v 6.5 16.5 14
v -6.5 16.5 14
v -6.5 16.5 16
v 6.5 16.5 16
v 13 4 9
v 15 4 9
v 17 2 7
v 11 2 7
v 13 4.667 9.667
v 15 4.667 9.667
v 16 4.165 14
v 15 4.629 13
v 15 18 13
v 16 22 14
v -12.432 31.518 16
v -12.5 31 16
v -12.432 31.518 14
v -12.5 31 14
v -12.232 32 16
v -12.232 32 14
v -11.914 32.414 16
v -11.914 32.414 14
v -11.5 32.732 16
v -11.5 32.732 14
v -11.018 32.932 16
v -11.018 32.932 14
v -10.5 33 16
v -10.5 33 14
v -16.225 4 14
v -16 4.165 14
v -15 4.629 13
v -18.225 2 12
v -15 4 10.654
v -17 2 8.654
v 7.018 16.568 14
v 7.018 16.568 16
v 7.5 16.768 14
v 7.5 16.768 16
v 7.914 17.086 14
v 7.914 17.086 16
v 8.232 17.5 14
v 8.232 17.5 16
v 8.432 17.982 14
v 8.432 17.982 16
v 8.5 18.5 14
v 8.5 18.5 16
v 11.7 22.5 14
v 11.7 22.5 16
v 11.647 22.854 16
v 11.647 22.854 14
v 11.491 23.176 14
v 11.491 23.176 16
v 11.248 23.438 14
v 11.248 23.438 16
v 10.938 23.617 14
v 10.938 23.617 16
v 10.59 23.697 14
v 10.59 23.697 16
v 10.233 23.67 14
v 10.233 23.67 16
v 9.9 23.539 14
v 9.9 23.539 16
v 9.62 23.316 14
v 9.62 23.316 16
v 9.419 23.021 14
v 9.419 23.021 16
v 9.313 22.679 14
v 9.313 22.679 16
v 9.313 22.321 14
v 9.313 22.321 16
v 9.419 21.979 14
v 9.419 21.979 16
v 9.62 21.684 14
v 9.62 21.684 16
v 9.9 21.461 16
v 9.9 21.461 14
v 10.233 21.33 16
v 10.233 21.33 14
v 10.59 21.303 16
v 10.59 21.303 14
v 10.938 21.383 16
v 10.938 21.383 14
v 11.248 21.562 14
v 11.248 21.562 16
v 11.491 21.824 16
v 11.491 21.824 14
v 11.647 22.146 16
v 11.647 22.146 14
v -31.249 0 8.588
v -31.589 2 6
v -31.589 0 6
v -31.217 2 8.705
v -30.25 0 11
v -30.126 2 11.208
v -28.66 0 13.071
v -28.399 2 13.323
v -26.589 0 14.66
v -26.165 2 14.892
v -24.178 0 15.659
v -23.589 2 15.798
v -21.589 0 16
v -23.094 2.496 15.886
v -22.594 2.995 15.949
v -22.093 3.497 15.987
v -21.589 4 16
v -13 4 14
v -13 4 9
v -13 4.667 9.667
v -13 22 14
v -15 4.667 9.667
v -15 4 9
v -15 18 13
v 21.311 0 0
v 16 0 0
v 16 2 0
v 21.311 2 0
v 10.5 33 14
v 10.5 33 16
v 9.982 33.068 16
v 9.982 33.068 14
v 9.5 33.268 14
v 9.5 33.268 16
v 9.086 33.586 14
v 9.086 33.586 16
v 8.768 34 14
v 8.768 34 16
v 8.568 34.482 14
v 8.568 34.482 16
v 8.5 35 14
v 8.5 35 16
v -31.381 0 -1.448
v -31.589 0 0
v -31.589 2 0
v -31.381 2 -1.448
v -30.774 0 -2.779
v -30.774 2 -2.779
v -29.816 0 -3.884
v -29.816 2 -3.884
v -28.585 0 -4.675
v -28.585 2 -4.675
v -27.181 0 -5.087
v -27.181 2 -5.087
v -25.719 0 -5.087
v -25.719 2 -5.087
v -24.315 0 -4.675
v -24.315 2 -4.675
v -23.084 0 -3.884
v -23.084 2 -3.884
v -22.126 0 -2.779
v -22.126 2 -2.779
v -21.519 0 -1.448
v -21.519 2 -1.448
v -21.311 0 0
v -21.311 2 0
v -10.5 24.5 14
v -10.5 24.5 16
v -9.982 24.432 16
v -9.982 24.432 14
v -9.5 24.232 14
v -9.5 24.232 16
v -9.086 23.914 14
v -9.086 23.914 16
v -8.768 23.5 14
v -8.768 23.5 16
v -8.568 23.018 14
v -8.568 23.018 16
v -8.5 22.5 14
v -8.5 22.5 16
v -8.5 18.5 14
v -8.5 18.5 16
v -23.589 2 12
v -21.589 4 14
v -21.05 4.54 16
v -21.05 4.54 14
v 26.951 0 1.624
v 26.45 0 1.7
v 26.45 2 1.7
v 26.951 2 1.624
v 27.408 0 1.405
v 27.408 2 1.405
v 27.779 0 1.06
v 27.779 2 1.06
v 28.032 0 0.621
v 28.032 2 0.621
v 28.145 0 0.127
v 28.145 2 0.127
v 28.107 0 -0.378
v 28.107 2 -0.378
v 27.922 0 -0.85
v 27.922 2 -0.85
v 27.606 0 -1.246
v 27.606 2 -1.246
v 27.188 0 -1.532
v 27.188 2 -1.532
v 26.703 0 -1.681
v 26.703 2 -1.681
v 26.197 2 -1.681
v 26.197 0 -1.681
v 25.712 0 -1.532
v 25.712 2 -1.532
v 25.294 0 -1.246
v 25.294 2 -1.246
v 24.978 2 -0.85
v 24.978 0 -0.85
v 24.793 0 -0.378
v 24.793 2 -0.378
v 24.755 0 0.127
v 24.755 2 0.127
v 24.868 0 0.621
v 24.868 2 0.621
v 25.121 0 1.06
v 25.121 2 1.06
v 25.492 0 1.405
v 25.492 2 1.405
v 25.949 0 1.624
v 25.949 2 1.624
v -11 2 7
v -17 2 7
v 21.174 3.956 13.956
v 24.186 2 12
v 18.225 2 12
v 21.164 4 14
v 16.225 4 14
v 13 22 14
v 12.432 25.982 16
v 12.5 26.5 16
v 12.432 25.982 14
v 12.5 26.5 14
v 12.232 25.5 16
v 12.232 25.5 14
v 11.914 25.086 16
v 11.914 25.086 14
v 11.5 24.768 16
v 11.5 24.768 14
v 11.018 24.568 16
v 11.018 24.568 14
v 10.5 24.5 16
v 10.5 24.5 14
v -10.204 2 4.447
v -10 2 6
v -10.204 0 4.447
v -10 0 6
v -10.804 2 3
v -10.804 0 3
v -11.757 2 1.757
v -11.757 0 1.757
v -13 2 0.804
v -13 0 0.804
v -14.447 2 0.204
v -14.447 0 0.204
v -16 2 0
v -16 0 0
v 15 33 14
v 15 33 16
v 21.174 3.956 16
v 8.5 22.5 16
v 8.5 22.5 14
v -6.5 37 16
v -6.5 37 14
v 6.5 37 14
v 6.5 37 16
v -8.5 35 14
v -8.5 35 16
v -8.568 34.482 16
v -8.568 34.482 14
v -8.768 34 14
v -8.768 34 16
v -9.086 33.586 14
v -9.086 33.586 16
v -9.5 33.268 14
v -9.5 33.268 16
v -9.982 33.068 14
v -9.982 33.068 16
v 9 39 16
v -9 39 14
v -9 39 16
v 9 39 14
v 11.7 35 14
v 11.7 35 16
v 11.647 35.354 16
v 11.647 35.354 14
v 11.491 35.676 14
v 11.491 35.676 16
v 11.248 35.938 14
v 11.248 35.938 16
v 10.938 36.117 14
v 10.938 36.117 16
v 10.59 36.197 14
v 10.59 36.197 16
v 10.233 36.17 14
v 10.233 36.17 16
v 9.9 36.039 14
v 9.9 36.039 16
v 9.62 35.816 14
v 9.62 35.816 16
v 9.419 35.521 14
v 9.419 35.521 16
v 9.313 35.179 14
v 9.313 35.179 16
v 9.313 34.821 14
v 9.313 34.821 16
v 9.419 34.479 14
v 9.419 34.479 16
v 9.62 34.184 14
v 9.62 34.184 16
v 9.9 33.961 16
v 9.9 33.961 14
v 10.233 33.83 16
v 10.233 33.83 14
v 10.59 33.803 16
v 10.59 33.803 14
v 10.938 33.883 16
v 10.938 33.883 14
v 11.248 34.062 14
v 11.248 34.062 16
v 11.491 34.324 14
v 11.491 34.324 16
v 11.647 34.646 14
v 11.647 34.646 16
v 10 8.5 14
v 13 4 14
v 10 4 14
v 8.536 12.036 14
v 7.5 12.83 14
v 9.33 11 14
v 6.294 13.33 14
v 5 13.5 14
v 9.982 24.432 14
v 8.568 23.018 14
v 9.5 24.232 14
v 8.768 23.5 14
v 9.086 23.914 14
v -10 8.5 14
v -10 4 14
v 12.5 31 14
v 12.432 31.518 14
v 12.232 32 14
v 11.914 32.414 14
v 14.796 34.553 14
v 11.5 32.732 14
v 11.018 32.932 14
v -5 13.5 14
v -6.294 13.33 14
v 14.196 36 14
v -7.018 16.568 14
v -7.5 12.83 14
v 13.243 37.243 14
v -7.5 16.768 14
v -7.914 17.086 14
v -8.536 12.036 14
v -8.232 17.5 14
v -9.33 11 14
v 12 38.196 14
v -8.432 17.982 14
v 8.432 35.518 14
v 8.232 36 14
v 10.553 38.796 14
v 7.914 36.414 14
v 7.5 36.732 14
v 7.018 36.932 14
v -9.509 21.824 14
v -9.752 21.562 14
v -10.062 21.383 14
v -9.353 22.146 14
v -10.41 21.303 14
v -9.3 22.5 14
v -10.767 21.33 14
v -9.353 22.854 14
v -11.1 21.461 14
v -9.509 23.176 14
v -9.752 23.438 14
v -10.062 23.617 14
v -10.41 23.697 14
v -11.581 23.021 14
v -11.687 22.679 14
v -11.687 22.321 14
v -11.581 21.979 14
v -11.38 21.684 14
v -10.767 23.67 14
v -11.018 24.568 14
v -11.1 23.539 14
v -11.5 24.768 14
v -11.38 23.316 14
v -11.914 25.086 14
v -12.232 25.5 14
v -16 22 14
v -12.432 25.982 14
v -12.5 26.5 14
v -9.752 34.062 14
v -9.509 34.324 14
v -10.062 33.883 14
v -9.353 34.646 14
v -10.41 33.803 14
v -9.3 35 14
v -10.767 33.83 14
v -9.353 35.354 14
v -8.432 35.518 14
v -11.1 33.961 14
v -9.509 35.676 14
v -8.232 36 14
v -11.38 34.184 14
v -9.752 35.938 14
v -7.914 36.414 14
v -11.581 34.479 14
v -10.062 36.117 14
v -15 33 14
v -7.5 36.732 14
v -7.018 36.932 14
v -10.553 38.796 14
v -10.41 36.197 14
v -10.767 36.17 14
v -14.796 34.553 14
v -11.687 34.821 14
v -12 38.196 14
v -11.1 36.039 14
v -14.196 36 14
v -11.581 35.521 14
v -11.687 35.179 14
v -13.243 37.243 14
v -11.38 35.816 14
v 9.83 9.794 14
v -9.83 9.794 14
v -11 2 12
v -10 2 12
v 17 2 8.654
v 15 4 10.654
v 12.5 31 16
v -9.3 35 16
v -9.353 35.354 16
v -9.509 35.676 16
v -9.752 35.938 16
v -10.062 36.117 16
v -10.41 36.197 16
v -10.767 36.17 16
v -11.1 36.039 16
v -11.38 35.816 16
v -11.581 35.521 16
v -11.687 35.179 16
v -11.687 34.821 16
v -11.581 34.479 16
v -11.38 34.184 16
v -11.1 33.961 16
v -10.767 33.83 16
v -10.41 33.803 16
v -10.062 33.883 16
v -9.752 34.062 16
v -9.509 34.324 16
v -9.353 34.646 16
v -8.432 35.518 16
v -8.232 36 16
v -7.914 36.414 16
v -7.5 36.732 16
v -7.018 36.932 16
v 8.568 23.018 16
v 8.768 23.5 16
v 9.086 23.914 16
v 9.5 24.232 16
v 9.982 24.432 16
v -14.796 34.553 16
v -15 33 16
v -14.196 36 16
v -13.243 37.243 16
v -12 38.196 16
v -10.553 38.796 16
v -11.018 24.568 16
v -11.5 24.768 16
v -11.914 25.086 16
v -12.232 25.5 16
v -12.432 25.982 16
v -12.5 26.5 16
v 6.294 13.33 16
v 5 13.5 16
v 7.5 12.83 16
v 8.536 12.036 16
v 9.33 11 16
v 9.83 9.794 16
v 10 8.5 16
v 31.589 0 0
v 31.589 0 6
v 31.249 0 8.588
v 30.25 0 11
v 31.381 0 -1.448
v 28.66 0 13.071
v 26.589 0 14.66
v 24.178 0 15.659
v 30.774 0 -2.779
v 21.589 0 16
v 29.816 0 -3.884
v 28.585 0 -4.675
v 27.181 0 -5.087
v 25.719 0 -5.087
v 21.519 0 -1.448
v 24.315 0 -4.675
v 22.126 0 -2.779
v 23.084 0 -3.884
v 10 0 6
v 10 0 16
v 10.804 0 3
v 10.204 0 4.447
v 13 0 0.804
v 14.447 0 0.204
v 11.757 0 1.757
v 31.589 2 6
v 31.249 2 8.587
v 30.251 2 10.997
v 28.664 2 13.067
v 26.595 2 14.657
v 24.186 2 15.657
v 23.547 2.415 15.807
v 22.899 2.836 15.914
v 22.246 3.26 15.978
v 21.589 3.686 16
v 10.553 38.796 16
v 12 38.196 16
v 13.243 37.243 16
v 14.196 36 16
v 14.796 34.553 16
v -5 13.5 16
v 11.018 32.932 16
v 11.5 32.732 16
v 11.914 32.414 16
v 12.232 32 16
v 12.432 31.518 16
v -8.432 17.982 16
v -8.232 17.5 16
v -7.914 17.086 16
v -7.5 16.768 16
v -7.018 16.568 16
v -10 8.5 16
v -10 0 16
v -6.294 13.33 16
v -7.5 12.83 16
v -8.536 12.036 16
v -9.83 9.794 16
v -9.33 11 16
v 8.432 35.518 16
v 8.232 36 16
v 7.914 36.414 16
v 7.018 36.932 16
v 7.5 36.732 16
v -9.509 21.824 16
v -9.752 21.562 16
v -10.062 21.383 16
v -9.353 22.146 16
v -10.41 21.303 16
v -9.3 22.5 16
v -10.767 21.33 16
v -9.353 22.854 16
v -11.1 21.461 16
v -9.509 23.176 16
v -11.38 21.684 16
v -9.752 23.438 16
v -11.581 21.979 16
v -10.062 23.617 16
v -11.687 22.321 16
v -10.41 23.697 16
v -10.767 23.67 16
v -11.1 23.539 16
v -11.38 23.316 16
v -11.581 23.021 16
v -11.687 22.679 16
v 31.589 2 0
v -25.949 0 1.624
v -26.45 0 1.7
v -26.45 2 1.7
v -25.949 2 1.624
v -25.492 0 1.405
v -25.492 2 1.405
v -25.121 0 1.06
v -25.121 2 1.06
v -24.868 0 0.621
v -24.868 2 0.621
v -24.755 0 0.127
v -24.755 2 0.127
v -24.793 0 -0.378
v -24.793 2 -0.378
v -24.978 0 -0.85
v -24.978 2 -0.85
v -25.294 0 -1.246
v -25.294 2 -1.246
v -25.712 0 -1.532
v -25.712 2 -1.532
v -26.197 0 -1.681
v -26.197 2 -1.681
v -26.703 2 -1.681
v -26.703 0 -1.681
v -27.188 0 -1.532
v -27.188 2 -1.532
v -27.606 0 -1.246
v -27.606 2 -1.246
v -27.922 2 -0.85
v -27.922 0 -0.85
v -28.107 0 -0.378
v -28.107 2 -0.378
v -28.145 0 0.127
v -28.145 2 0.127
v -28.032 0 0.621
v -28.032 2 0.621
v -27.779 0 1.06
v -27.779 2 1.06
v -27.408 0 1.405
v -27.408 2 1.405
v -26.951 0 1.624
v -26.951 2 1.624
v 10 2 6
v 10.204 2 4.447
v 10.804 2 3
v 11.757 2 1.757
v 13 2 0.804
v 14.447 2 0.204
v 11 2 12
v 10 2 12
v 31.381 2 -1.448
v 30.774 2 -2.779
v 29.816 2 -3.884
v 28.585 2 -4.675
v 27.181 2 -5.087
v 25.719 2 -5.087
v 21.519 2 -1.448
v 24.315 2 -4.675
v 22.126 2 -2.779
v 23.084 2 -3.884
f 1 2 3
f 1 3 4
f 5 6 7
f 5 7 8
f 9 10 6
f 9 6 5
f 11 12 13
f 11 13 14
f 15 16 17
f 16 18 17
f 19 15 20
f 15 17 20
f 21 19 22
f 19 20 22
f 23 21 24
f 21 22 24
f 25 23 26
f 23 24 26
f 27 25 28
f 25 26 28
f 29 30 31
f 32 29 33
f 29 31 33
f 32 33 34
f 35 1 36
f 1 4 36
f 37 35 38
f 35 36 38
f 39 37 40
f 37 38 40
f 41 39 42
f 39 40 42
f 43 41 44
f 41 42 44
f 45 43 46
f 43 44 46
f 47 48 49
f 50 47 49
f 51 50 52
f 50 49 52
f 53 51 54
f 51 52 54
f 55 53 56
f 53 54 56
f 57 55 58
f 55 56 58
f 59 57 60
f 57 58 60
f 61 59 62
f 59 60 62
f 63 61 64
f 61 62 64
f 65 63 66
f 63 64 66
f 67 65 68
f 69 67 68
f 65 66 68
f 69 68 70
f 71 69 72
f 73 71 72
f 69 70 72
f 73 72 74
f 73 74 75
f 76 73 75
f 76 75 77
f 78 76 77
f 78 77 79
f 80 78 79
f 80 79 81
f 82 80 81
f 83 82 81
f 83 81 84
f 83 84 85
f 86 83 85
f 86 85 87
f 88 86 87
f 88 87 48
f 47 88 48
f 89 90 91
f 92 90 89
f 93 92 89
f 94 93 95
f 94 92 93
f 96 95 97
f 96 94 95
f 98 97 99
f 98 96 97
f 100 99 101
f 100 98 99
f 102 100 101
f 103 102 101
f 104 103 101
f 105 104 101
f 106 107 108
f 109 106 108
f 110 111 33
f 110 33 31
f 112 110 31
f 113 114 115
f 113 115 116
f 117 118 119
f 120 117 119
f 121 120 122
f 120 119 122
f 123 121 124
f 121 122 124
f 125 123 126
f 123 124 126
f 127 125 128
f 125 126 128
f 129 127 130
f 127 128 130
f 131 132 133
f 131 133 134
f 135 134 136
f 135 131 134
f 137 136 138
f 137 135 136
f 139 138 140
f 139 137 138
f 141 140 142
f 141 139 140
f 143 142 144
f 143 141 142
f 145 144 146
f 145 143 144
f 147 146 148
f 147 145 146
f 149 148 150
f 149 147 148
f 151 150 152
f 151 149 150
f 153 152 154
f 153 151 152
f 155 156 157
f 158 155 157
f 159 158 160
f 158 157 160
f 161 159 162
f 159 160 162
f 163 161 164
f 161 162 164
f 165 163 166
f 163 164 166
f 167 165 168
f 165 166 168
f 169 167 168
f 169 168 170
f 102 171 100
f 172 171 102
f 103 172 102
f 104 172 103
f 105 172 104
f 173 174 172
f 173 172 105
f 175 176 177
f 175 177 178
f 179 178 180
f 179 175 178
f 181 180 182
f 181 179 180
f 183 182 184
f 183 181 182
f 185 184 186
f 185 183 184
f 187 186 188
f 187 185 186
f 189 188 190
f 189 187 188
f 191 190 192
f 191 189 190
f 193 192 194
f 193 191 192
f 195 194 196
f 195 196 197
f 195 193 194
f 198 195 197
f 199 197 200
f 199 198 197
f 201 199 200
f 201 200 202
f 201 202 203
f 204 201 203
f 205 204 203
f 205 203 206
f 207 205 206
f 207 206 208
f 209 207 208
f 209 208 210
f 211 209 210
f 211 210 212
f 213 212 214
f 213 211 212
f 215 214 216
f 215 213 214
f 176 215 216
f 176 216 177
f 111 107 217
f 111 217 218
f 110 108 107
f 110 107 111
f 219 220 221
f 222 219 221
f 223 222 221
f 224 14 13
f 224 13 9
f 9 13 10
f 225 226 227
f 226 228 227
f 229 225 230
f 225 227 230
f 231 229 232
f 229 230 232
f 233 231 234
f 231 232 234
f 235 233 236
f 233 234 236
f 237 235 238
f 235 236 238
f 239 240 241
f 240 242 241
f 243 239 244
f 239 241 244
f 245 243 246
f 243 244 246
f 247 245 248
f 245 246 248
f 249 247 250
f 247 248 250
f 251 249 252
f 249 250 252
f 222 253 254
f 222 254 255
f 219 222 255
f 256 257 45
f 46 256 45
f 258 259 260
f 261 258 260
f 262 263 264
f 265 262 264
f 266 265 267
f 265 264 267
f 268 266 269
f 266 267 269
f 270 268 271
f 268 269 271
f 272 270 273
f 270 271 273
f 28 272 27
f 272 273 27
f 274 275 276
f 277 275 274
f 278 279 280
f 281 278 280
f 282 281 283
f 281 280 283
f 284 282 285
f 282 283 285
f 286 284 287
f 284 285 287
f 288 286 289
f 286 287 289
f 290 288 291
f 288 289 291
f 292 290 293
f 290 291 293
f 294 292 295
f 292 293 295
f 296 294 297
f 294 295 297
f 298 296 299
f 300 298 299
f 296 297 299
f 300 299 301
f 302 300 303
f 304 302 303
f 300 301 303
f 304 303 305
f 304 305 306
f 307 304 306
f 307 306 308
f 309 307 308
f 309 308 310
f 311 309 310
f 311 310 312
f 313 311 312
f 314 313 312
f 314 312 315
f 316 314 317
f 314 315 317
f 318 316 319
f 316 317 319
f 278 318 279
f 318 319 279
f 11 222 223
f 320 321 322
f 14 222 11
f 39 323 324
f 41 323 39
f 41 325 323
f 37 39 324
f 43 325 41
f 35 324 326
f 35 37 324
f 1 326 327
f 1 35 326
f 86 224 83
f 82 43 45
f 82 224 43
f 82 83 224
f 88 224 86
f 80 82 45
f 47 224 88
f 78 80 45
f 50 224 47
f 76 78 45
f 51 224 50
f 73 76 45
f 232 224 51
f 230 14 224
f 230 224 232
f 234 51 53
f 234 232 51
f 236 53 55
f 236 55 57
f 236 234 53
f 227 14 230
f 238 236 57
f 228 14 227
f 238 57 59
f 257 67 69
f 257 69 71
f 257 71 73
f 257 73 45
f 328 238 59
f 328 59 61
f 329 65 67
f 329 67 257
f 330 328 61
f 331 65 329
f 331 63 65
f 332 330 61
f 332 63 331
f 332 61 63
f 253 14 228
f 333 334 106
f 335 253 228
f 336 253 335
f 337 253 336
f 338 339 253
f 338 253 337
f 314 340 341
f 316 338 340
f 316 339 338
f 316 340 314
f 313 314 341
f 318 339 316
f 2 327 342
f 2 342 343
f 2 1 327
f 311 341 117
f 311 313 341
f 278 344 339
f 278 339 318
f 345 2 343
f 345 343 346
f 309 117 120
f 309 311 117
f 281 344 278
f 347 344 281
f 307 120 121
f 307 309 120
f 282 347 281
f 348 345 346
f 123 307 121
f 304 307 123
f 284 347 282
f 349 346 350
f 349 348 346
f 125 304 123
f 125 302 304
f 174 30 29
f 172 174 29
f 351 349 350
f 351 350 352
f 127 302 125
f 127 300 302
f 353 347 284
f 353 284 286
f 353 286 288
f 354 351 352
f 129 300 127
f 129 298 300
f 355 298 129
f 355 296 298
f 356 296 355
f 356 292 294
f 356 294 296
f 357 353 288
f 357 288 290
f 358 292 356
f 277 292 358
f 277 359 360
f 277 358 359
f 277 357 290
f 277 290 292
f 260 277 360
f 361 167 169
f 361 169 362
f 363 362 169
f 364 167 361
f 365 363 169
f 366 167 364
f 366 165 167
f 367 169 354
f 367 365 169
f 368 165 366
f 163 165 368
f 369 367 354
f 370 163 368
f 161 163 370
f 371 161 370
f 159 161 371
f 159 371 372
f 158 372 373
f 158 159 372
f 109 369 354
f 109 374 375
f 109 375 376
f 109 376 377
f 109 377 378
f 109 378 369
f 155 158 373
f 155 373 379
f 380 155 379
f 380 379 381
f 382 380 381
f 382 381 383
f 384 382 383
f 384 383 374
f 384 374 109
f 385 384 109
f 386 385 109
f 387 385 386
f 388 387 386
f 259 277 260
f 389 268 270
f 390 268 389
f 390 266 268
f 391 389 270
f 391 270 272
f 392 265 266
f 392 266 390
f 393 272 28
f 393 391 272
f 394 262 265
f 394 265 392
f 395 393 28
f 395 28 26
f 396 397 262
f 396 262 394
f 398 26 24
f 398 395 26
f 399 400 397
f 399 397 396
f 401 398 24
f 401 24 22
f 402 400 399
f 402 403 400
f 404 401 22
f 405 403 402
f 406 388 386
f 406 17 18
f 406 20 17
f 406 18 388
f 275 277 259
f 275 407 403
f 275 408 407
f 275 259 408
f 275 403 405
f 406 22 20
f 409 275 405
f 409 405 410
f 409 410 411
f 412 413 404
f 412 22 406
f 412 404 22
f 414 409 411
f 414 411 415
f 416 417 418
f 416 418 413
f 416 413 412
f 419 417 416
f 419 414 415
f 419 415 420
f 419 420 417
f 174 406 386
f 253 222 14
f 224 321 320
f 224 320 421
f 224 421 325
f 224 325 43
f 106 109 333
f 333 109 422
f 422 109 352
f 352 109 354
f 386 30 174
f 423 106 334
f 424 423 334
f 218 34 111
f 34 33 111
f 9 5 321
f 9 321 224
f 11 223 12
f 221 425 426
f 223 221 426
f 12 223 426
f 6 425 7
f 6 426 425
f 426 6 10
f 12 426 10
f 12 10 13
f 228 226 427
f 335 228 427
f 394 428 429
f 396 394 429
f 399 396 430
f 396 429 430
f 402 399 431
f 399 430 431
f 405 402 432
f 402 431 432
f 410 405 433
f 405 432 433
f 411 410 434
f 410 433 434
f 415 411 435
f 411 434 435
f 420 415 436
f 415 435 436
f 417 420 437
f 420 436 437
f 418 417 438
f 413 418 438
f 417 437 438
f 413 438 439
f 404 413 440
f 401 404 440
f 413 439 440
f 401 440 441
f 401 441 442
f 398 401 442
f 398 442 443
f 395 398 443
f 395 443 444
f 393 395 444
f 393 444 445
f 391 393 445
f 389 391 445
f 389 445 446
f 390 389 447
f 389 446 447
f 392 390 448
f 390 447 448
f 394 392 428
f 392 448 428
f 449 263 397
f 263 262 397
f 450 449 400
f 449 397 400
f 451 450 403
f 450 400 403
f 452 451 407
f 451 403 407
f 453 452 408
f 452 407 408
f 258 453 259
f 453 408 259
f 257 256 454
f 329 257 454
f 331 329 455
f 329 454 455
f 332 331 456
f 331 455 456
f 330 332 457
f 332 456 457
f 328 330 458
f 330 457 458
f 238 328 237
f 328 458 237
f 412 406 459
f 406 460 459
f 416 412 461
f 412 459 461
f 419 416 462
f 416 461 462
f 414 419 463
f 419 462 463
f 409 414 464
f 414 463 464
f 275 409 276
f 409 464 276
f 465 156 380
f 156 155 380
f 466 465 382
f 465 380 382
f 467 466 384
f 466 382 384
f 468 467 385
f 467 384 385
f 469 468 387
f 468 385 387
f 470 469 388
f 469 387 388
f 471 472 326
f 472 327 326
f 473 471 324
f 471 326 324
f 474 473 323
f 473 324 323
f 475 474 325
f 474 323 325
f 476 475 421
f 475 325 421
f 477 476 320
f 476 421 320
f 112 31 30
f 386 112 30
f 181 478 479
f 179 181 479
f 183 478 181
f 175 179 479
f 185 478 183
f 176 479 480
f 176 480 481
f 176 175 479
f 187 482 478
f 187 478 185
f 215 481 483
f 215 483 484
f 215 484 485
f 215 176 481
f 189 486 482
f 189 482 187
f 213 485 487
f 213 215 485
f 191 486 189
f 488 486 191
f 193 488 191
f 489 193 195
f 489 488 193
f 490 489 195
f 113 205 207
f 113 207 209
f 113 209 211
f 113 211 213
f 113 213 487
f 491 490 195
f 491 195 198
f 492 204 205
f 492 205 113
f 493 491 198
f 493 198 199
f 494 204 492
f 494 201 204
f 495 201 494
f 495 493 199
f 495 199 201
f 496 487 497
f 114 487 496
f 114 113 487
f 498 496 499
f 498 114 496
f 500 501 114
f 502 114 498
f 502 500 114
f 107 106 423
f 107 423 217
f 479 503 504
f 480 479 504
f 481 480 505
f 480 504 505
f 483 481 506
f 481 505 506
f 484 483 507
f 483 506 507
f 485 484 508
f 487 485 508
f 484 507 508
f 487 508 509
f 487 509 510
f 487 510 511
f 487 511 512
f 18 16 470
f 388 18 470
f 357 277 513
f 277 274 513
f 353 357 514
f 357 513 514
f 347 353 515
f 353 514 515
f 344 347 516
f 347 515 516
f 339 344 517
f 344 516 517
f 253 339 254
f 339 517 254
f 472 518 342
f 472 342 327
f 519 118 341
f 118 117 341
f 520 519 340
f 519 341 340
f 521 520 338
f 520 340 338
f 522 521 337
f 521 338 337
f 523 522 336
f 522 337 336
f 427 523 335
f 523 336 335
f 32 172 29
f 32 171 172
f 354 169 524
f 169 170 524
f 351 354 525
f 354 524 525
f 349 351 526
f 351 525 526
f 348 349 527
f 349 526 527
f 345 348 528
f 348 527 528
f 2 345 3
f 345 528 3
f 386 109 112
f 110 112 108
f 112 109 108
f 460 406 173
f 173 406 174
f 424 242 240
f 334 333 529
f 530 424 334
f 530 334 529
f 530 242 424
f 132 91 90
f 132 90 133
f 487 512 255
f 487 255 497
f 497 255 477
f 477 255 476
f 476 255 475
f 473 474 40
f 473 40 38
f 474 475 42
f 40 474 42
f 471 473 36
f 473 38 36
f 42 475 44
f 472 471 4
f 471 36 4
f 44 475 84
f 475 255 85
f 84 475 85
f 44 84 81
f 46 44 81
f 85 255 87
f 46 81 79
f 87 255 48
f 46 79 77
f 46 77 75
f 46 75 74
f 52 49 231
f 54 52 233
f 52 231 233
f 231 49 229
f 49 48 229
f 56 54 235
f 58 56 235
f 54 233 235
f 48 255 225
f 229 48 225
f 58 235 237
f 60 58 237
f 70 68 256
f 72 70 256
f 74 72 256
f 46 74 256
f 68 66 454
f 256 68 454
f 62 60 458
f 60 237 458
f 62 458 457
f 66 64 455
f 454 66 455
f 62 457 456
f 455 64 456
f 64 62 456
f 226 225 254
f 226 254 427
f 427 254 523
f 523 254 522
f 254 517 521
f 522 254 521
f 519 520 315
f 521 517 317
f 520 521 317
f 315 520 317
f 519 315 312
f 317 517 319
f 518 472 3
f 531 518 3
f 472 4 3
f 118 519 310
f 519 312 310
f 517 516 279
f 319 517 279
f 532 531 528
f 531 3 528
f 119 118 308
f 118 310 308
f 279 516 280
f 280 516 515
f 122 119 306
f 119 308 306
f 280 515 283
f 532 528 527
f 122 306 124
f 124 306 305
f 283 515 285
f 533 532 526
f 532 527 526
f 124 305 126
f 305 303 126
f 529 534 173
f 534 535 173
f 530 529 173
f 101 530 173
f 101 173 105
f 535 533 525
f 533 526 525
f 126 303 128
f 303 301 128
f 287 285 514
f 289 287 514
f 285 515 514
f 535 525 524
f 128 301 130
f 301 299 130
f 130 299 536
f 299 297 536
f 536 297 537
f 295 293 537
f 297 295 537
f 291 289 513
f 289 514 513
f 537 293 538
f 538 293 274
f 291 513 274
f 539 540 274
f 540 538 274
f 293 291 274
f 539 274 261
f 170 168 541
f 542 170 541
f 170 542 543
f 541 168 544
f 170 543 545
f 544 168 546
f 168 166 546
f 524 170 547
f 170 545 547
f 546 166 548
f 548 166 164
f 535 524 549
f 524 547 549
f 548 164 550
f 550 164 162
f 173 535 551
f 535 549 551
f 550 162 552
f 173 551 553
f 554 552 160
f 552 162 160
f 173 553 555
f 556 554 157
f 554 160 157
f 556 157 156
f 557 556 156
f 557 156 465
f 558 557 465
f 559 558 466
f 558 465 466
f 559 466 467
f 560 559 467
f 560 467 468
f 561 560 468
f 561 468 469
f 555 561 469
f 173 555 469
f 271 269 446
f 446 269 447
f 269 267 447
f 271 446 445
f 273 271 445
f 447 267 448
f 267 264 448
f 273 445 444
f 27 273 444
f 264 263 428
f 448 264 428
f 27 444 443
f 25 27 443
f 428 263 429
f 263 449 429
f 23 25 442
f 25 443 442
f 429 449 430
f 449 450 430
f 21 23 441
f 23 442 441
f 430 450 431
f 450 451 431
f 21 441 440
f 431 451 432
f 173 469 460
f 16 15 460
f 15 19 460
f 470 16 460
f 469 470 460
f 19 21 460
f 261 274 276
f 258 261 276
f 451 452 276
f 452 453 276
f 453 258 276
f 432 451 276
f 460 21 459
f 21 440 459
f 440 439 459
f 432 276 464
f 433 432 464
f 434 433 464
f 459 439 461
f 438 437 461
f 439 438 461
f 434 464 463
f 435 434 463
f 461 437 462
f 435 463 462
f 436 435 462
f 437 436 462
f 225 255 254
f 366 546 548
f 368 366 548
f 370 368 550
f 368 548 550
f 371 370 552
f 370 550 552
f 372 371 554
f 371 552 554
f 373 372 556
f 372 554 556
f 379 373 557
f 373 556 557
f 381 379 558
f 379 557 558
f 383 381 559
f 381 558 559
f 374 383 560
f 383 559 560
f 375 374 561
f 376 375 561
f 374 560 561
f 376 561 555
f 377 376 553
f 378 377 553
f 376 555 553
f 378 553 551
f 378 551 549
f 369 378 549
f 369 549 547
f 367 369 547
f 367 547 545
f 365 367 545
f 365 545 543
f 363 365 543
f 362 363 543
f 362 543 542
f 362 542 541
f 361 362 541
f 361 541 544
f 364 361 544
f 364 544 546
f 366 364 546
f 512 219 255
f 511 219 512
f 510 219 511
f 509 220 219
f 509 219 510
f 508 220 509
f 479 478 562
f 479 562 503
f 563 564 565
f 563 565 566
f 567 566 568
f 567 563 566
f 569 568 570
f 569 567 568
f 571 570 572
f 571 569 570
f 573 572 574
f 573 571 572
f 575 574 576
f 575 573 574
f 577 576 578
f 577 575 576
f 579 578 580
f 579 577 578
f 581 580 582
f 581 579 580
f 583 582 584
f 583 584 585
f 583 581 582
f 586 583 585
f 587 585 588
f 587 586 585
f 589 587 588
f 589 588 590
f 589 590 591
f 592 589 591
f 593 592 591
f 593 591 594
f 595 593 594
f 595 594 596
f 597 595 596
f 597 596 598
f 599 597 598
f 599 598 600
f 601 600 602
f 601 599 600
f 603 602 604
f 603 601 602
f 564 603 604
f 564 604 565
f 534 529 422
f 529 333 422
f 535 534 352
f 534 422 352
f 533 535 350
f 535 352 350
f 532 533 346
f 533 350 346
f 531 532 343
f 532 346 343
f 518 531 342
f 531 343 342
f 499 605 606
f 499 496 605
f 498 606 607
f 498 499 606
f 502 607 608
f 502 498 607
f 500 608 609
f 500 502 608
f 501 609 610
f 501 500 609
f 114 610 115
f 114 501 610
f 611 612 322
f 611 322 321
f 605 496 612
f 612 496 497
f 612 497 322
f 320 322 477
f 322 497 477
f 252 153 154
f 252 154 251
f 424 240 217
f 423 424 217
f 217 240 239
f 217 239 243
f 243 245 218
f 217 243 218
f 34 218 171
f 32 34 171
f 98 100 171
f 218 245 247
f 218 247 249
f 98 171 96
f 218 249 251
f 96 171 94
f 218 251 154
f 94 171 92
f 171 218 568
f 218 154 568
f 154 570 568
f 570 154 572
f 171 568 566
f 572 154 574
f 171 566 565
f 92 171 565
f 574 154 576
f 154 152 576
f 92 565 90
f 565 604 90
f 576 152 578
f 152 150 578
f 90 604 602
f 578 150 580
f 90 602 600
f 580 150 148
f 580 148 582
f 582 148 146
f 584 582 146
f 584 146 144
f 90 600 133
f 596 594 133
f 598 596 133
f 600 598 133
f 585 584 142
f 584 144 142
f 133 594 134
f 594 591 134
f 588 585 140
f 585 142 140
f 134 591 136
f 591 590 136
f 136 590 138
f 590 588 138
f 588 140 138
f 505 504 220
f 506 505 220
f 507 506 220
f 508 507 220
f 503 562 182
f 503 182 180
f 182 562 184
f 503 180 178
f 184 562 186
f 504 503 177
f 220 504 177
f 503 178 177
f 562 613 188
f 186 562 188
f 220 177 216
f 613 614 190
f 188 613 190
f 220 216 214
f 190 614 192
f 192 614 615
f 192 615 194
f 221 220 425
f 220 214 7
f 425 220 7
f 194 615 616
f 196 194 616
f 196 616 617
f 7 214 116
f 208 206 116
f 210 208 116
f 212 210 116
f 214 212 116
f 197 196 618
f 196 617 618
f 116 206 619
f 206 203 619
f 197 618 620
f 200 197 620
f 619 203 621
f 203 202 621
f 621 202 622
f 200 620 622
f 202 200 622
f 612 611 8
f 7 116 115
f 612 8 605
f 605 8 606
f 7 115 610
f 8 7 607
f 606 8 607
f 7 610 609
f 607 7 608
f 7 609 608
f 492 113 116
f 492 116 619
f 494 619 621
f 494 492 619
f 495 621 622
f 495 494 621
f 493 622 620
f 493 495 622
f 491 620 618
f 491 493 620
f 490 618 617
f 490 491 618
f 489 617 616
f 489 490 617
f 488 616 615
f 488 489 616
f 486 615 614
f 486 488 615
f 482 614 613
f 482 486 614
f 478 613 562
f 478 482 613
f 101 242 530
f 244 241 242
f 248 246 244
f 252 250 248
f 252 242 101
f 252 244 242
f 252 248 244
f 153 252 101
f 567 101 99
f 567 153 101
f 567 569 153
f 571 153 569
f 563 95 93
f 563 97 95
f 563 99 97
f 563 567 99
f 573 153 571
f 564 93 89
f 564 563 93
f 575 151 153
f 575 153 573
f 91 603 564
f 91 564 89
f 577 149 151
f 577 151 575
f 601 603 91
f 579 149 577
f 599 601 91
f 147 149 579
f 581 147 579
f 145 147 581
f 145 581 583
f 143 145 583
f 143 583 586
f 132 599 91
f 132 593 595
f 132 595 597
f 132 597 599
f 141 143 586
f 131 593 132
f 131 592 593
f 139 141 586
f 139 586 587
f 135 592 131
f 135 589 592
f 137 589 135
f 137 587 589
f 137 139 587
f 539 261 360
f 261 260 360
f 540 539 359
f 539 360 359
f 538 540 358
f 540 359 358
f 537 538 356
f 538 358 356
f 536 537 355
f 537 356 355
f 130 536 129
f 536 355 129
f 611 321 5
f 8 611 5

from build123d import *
from OCP.BRepFilletAPI import BRepFilletAPI_MakeChamfer

# Parameters (mm, degrees)
SKETCH1_R             = 1.7
BOSS_EXTRUDE1_DEPTH   = 2
SKETCH2_W             = 30
SKETCH2_H             = 2
BOSS_EXTRUDE2_DEPTH   = 35
CUT_EXTRUDE1_DEPTH    = 2
SKETCH5_W             = 17
SKETCH5_H             = 15.5
CUT_EXTRUDE2_DEPTH    = 2
SKETCH6_R             = 1.2
CUT_EXTRUDE3_DEPTH    = 2
BOSS_EXTRUDE4_START   = -2
SKETCH7_W             = 30
SKETCH7_H             = 2
BOSS_EXTRUDE4_DEPTH   = 2
SKETCH8_W             = 20
SKETCH8_H             = 3
CUT_EXTRUDE4_DEPTH    = 2
SKETCH9_W             = 17
SKETCH9_H             = 3
CUT_EXTRUDE5_DEPTH    = 2
SKETCH10_W            = 2
SKETCH10_H            = 20
BOSS_EXTRUDE5_DEPTH   = 5
CUT_EXTRUDE6_START    = -30
CUT_EXTRUDE6_DEPTH    = 30
FILLET1_R             = 10
SKETCH12_W            = 20
SKETCH12_H            = 18.563508327
CUT_EXTRUDE7_DEPTH    = 2
FILLET2_R             = 2
BOSS_EXTRUDE6_START   = -2
BOSS_EXTRUDE6_DEPTH   = 2
BOSS_EXTRUDE7_START   = -2
SKETCH14_W            = 21
SKETCH14_H            = 11.5
BOSS_EXTRUDE7_DEPTH   = 2
BOSS_EXTRUDE8_START   = -2
BOSS_EXTRUDE8_DEPTH   = 2
FILLET3_R             = 2
FILLET4_R             = 6
SKETCH16_W            = 20
SKETCH16_H            = 8.5
CUT_EXTRUDE8_DEPTH    = 2
FILLET5_R             = 5
CHAMFER1_SIZE         = 2
CHAMFER1_SIZE2        = 2.748737084
CHAMFER1_SIZE2_2      = 2.596624047
CHAMFER2_SIZE         = 1
CHAMFER2_EDGE_2_SIZE  = 1
CHAMFER2_EDGE_3_SIZE  = 1
CHAMFER2_EDGE_3_SIZE2 = 2.732050808
CHAMFER2_EDGE_4_SIZE  = 1
CHAMFER2_EDGE_4_SIZE2 = 2.732050808
FILLET6_R             = 6


# Some blends are built 0.0001 mm under size
with BuildPart() as part:
    # Sketch1 → Boss-Extrude1 (new body)
    with BuildSketch(Plane(origin=(0, 0, 0), x_dir=(1, 0, 0), z_dir=(0, 1, 0))):
        with BuildLine():
            Line((-21.310608918, 0), (21.310608918, 0))
            ThreePointArc((21.310608918, 0), (26.45, 5.139391082), (31.589391082, 0))
            Line((31.589391082, 0), (31.589391082, -16))
            Line((31.589391082, -16), (10, -16))
            Line((10, -16), (10, -10.526162893))
            Line((10, -10.526162893), (10, -3))
            Line((10, -3), (-10, -3))
            Line((-10, -3), (-10, -10.526162893))
            Line((-10, -10.526162893), (-10, -16))
            Line((-10, -16), (-31.589391082, -16))
            Line((-31.589391082, -16), (-31.589391082, 0))
            ThreePointArc((-31.589391082, 0), (-26.45, 5.139391082), (-21.310608918, 0))
        make_face()
        with Locations(Location((-26.45, 0, 0), (0, 0, 270))):
            Circle(SKETCH1_R, mode=Mode.SUBTRACT)
        with Locations(Location((26.45, 0, 0), (0, 0, 270))):
            Circle(SKETCH1_R, mode=Mode.SUBTRACT)
    extrude(amount=BOSS_EXTRUDE1_DEPTH)

    # Sketch2 → Boss-Extrude2 (add)
    with BuildSketch(Plane(origin=(0, 2, 0), x_dir=(1, 0, 0), z_dir=(0, 1, 0))):
        with Locations((0, -15)):
            Rectangle(SKETCH2_W, SKETCH2_H)
    extrude(amount=BOSS_EXTRUDE2_DEPTH)

    # Sketch4 → Cut-Extrude1 (cut)
    with BuildSketch(Plane.XY.offset(16)):
        with BuildLine():
            Line((-12.5, 33), (-12.5, 24.5))
            Line((-12.5, 24.5), (-10.5, 24.5))
            ThreePointArc((-10.5, 24.5), (-9.085786438, 23.914213562), (-8.5, 22.5))
            Line((-8.5, 22.5), (-8.5, 20.5))
            Line((-8.5, 20.5), (8.5, 20.5))
            Line((8.5, 20.5), (8.5, 22.5))
            ThreePointArc((8.5, 22.5), (9.085786438, 23.914213562), (10.5, 24.5))
            Line((10.5, 24.5), (12.5, 24.5))
            Line((12.5, 24.5), (12.5, 33))
            Line((12.5, 33), (10.5, 33))
            ThreePointArc((10.5, 33), (9.085786438, 33.585786438), (8.5, 35))
            Line((8.5, 35), (8.5, 37))
            Line((8.5, 37), (-8.5, 37))
            Line((-8.5, 37), (-8.5, 35))
            ThreePointArc((-8.5, 35), (-9.085786438, 33.585786438), (-10.5, 33))
            Line((-10.5, 33), (-12.5, 33))
        make_face()
    extrude(amount=-CUT_EXTRUDE1_DEPTH, mode=Mode.SUBTRACT)

    # Sketch5 → Cut-Extrude2 (cut)
    with BuildSketch(Plane.XY.offset(16)):
        with Locations((0, 12.75)):
            Rectangle(SKETCH5_W, SKETCH5_H)
    extrude(amount=-CUT_EXTRUDE2_DEPTH, mode=Mode.SUBTRACT)

    # Sketch6 → Cut-Extrude3 (cut)
    with BuildSketch(Plane.XY.offset(16)):
        with Locations((-10.5, 35)):
            Circle(SKETCH6_R)
        with Locations((10.5, 35)):
            Circle(SKETCH6_R)
        with Locations((-10.5, 22.5)):
            Circle(SKETCH6_R)
        with Locations((10.5, 22.5)):
            Circle(SKETCH6_R)
    extrude(amount=-CUT_EXTRUDE3_DEPTH, mode=Mode.SUBTRACT)

    # Sketch7 → Boss-Extrude4 (add)
    with BuildSketch(Plane.XY.offset(16).offset(BOSS_EXTRUDE4_START)):
        with Locations((0, 38)):
            Rectangle(SKETCH7_W, SKETCH7_H)
    extrude(amount=BOSS_EXTRUDE4_DEPTH)

    # Sketch8 → Cut-Extrude4 (cut)
    with BuildSketch(Plane(origin=(0, 2, 0), x_dir=(1, 0, 0), z_dir=(0, 1, 0))):
        with Locations((0, -1.5)):
            Rectangle(SKETCH8_W, SKETCH8_H)
    extrude(amount=-CUT_EXTRUDE4_DEPTH, mode=Mode.SUBTRACT)

    # Sketch9 → Cut-Extrude5 (cut)
    with BuildSketch(Plane.XY.offset(16)):
        with Locations((0, 3.5)):
            Rectangle(SKETCH9_W, SKETCH9_H)
    extrude(amount=-CUT_EXTRUDE5_DEPTH, mode=Mode.SUBTRACT)

    # Sketch10 → Boss-Extrude5 (add)
    with BuildSketch(Plane(origin=(0, 0, 14), x_dir=(-1, 0, 0), z_dir=(0, 0, -1))):
        with Locations((14, 12)):
            Rectangle(SKETCH10_W, SKETCH10_H)
        with Locations((-14, 12)):
            Rectangle(SKETCH10_W, SKETCH10_H)
    extrude(amount=BOSS_EXTRUDE5_DEPTH)

    # Sketch11 → Cut-Extrude6 (cut)
    with BuildSketch(Plane.ZY.offset(15).offset(CUT_EXTRUDE6_START)):
        Polygon((14, 22), (9, 2), (9, 22), align=None)
    extrude(amount=CUT_EXTRUDE6_DEPTH, mode=Mode.SUBTRACT)

    # Fillet1
    fillet1_edges = [part.edges().sort_by_distance(p)[0] for p in [
        (31.589391082, 1, 16),
        (-31.589391082, 1, 16),
    ]]
    fillet(fillet1_edges, radius=FILLET1_R)

    # Sketch12 → Cut-Extrude7 (cut)
    with BuildSketch(Plane.XY.offset(16)):
        with Locations((0, 11.281754164)):
            Rectangle(SKETCH12_W, SKETCH12_H)
    extrude(amount=-CUT_EXTRUDE7_DEPTH, mode=Mode.SUBTRACT)

    # Fillet2
    # the kernel refuses this fillet: 2 mm, written as the material it takes off along each edge
    with BuildSketch(Plane(origin=(8.5, 20.563508327, 9.158770817), x_dir=(0, 1, 0), z_dir=(0, 0, 1))) as fillet2_piece_1:
        with BuildLine():
            CenterArc((1.936491673, -2), FILLET2_R, 90, 75.522487814)
            Line((0, -1.5), (-0.038729833, -1.49))
            ThreePointArc((-0.038729833, -1.49), (-0.04, -0.75), (-0.04, 0))
            Line((-0.04, 0), (0, 0.04))
            Line((0, 0.04), (1.936491673, 0.04))
            Line((1.936491673, 0.04), (1.936491673, 0))
        make_face()
    extrude(amount=11.682458366, mode=Mode.SUBTRACT)
    with BuildSketch(Plane(origin=(-8.5, 20.563508327, 9.158770817), x_dir=(-1, 0, 0), z_dir=(0, 0, 1))) as fillet2_piece_2:
        with BuildLine():
            CenterArc((2, -1.936491673), FILLET2_R, 104.477512186, 75.522487814)
            Line((0, -1.936491673), (-0.04, -1.936491673))
            Line((-0.04, -1.936491673), (-0.04, 0))
            Line((-0.04, 0), (0, 0.04))
            ThreePointArc((0, 0.04), (0.75, 0.04), (1.49, 0.038729833))
            Line((1.49, 0.038729833), (1.5, 0))
        make_face()
    extrude(amount=11.682458366, mode=Mode.SUBTRACT)

    # Sketch13 → Boss-Extrude6 (add)
    with BuildSketch(Plane.XY.offset(16).offset(BOSS_EXTRUDE6_START)):
        Polygon((-15, 2), (-15, 33), (-21.589391082, 2), align=None)
        Polygon((21.589391082, 2), (15, 2), (15, 33), align=None)
    extrude(amount=BOSS_EXTRUDE6_DEPTH)

    # Sketch14 → Boss-Extrude7 (add)
    with BuildSketch(Plane.XY.offset(16).offset(BOSS_EXTRUDE7_START)):
        with Locations((0, 10.75)):
            Rectangle(SKETCH14_W, SKETCH14_H)
    extrude(amount=BOSS_EXTRUDE7_DEPTH)

    # Sketch15 → Boss-Extrude8 (add)
    with BuildSketch(Plane.XY.offset(16).offset(BOSS_EXTRUDE8_START)):
        with BuildLine():
            Line((-8.5, 22.5), (-8.5, 16.5))
            Line((-8.5, 16.5), (-10, 16.5))
            Line((-10, 16.5), (-10, 20.563508327))
            ThreePointArc((-10, 20.563508327), (-8.91886117, 21.275255129), (-8.5, 22.5))
        make_face()
        with BuildLine():
            Line((8.5, 22.5), (8.5, 16.5))
            Line((8.5, 16.5), (10, 16.5))
            Line((10, 16.5), (10, 20.563508327))
            ThreePointArc((10, 20.563508327), (8.91886117, 21.275255129), (8.5, 22.5))
        make_face()
    extrude(amount=BOSS_EXTRUDE8_DEPTH)

    # Fillet3
    fillet3_edges = [part.edges().sort_by_distance(p)[0] for p in [
        (-8.5, 16.5, 15),
        (8.5, 16.5, 15),
        (12.5, 24.5, 15),
        (-12.5, 24.5, 15),
        (12.5, 33, 15),
        (8.5, 37, 15),
        (-8.5, 37, 15),
        (-12.5, 33, 15),
    ]]
    fillet(fillet3_edges, radius=FILLET3_R - 0.0001)  # a hair under: the kernel refuses the full size

    # Fillet4
    fillet4_edges = [part.edges().sort_by_distance(p)[0] for p in [
        (15, 39, 15),
        (-15, 39, 15),
    ]]
    fillet(fillet4_edges, radius=FILLET4_R - 0.0001)  # a hair under: the kernel refuses the full size

    # Sketch16 → Cut-Extrude8 (cut)
    with BuildSketch(Plane.XY.offset(16)):
        with Locations((0, 9.25)):
            Rectangle(SKETCH16_W, SKETCH16_H)
    extrude(amount=-CUT_EXTRUDE8_DEPTH, mode=Mode.SUBTRACT)

    # Fillet5
    fillet5_edges = [part.edges().sort_by_distance(p)[0] for p in [
        (-10, 13.5, 15),
        (10, 13.5, 15),
    ]]
    fillet(fillet5_edges, radius=FILLET5_R)

    # Chamfer1: one chamfer whose edges measure the first distance from different faces: ONE call of the kernel's chamfer builder (chamfer() names one face for all edges)
    chamfer1_edges_1 = [part.edges().sort_by_distance(p)[0] for p in [
        (-13, 2, 11.5),
        (11.5, 2, 14),
        (13, 2, 11.5),
        (-18.294695541, 2, 14),
        (15, 2, 11.5),
        (18.294695541, 2, 14),
        (-11.5, 2, 14),
        (-15, 2, 11.5),
    ]]
    chamfer1_edges_2 = [part.edges().sort_by_distance(p)[0] for p in [
        (-14, 2, 9),
    ]]
    chamfer1_side_2 = [part.faces().sort_by_distance(p)[0] for p in [
        (-21.362181676, 2, 5.92457091),
    ]]
    chamfer1_edges_3 = [part.edges().sort_by_distance(p)[0] for p in [
        (14, 2, 9),
    ]]
    chamfer1_side_3 = [part.faces().sort_by_distance(p)[0] for p in [
        (21.362181676, 2, 5.92457091),
    ]]
    chamfer1_edges_4 = [part.edges().sort_by_distance(p)[0] for p in [
        (-21.589391082, 2, 15),
    ]]
    chamfer1_side_4 = [part.faces().sort_by_distance(p)[0] for p in [
        (-21.362181676, 2, 5.92457091),
    ]]
    chamfer1_edges_5 = [part.edges().sort_by_distance(p)[0] for p in [
        (21.589391082, 2, 15),
    ]]
    chamfer1_side_5 = [part.faces().sort_by_distance(p)[0] for p in [
        (18.294695541, 17.5, 15),
    ]]
    chamfer1 = BRepFilletAPI_MakeChamfer(part.part.solid().wrapped)
    for e in chamfer1_edges_1:
        chamfer1.Add(CHAMFER1_SIZE, e.wrapped)
    for e in chamfer1_edges_2:
        chamfer1.Add(CHAMFER1_SIZE, CHAMFER1_SIZE2, e.wrapped, chamfer1_side_2[0].wrapped)  # the first distance lies on this face
    for e in chamfer1_edges_3:
        chamfer1.Add(CHAMFER1_SIZE, CHAMFER1_SIZE2, e.wrapped, chamfer1_side_3[0].wrapped)  # the first distance lies on this face
    for e in chamfer1_edges_4:
        chamfer1.Add(CHAMFER1_SIZE, CHAMFER1_SIZE2_2, e.wrapped, chamfer1_side_4[0].wrapped)  # the first distance lies on this face
    for e in chamfer1_edges_5:
        chamfer1.Add(CHAMFER1_SIZE, CHAMFER1_SIZE2_2, e.wrapped, chamfer1_side_5[0].wrapped)  # the first distance lies on this face
    add(Compound.cast(chamfer1.Shape()), mode=Mode.REPLACE)

    # Chamfer2
    chamfer2_edges = [part.edges().sort_by_distance(p)[0] for p in [
        (15, 13, 14),
    ]]
    chamfer(chamfer2_edges, length=CHAMFER2_SIZE)

    # Chamfer2 edge 2
    chamfer2_edge_2_edges = [part.edges().sort_by_distance(p)[0] for p in [
        (-15, 13, 14),
    ]]
    chamfer(chamfer2_edge_2_edges, length=CHAMFER2_EDGE_2_SIZE)

    # Chamfer2 edge 3
    chamfer2_edge_3_edges = [part.edges().sort_by_distance(p)[0] for p in [
        (16, 3, 13),
    ]]
    chamfer2_edge_3_side = [part.faces().sort_by_distance(p)[0] for p in [
        (19.357625286, 2.973019207, 12.973019207),
    ]]
    chamfer(chamfer2_edge_3_edges, length=CHAMFER2_EDGE_3_SIZE, length2=CHAMFER2_EDGE_3_SIZE2, reference=chamfer2_edge_3_side[0])

    # Chamfer2 edge 4
    chamfer2_edge_4_edges = [part.edges().sort_by_distance(p)[0] for p in [
        (-16, 3, 13),
    ]]
    chamfer2_edge_4_side = [part.faces().sort_by_distance(p)[0] for p in [
        (-19.294695541, 3, 13),
    ]]
    chamfer(chamfer2_edge_4_edges, length=CHAMFER2_EDGE_4_SIZE, length2=CHAMFER2_EDGE_4_SIZE2, reference=chamfer2_edge_4_side[0])

    # Fillet6
    fillet6_edges = [part.edges().sort_by_distance(p)[0] for p in [
        (-10, 1, 0),
        (10, 1, 0),
    ]]
    fillet(fillet6_edges, radius=FILLET6_R)


solid = part.part
